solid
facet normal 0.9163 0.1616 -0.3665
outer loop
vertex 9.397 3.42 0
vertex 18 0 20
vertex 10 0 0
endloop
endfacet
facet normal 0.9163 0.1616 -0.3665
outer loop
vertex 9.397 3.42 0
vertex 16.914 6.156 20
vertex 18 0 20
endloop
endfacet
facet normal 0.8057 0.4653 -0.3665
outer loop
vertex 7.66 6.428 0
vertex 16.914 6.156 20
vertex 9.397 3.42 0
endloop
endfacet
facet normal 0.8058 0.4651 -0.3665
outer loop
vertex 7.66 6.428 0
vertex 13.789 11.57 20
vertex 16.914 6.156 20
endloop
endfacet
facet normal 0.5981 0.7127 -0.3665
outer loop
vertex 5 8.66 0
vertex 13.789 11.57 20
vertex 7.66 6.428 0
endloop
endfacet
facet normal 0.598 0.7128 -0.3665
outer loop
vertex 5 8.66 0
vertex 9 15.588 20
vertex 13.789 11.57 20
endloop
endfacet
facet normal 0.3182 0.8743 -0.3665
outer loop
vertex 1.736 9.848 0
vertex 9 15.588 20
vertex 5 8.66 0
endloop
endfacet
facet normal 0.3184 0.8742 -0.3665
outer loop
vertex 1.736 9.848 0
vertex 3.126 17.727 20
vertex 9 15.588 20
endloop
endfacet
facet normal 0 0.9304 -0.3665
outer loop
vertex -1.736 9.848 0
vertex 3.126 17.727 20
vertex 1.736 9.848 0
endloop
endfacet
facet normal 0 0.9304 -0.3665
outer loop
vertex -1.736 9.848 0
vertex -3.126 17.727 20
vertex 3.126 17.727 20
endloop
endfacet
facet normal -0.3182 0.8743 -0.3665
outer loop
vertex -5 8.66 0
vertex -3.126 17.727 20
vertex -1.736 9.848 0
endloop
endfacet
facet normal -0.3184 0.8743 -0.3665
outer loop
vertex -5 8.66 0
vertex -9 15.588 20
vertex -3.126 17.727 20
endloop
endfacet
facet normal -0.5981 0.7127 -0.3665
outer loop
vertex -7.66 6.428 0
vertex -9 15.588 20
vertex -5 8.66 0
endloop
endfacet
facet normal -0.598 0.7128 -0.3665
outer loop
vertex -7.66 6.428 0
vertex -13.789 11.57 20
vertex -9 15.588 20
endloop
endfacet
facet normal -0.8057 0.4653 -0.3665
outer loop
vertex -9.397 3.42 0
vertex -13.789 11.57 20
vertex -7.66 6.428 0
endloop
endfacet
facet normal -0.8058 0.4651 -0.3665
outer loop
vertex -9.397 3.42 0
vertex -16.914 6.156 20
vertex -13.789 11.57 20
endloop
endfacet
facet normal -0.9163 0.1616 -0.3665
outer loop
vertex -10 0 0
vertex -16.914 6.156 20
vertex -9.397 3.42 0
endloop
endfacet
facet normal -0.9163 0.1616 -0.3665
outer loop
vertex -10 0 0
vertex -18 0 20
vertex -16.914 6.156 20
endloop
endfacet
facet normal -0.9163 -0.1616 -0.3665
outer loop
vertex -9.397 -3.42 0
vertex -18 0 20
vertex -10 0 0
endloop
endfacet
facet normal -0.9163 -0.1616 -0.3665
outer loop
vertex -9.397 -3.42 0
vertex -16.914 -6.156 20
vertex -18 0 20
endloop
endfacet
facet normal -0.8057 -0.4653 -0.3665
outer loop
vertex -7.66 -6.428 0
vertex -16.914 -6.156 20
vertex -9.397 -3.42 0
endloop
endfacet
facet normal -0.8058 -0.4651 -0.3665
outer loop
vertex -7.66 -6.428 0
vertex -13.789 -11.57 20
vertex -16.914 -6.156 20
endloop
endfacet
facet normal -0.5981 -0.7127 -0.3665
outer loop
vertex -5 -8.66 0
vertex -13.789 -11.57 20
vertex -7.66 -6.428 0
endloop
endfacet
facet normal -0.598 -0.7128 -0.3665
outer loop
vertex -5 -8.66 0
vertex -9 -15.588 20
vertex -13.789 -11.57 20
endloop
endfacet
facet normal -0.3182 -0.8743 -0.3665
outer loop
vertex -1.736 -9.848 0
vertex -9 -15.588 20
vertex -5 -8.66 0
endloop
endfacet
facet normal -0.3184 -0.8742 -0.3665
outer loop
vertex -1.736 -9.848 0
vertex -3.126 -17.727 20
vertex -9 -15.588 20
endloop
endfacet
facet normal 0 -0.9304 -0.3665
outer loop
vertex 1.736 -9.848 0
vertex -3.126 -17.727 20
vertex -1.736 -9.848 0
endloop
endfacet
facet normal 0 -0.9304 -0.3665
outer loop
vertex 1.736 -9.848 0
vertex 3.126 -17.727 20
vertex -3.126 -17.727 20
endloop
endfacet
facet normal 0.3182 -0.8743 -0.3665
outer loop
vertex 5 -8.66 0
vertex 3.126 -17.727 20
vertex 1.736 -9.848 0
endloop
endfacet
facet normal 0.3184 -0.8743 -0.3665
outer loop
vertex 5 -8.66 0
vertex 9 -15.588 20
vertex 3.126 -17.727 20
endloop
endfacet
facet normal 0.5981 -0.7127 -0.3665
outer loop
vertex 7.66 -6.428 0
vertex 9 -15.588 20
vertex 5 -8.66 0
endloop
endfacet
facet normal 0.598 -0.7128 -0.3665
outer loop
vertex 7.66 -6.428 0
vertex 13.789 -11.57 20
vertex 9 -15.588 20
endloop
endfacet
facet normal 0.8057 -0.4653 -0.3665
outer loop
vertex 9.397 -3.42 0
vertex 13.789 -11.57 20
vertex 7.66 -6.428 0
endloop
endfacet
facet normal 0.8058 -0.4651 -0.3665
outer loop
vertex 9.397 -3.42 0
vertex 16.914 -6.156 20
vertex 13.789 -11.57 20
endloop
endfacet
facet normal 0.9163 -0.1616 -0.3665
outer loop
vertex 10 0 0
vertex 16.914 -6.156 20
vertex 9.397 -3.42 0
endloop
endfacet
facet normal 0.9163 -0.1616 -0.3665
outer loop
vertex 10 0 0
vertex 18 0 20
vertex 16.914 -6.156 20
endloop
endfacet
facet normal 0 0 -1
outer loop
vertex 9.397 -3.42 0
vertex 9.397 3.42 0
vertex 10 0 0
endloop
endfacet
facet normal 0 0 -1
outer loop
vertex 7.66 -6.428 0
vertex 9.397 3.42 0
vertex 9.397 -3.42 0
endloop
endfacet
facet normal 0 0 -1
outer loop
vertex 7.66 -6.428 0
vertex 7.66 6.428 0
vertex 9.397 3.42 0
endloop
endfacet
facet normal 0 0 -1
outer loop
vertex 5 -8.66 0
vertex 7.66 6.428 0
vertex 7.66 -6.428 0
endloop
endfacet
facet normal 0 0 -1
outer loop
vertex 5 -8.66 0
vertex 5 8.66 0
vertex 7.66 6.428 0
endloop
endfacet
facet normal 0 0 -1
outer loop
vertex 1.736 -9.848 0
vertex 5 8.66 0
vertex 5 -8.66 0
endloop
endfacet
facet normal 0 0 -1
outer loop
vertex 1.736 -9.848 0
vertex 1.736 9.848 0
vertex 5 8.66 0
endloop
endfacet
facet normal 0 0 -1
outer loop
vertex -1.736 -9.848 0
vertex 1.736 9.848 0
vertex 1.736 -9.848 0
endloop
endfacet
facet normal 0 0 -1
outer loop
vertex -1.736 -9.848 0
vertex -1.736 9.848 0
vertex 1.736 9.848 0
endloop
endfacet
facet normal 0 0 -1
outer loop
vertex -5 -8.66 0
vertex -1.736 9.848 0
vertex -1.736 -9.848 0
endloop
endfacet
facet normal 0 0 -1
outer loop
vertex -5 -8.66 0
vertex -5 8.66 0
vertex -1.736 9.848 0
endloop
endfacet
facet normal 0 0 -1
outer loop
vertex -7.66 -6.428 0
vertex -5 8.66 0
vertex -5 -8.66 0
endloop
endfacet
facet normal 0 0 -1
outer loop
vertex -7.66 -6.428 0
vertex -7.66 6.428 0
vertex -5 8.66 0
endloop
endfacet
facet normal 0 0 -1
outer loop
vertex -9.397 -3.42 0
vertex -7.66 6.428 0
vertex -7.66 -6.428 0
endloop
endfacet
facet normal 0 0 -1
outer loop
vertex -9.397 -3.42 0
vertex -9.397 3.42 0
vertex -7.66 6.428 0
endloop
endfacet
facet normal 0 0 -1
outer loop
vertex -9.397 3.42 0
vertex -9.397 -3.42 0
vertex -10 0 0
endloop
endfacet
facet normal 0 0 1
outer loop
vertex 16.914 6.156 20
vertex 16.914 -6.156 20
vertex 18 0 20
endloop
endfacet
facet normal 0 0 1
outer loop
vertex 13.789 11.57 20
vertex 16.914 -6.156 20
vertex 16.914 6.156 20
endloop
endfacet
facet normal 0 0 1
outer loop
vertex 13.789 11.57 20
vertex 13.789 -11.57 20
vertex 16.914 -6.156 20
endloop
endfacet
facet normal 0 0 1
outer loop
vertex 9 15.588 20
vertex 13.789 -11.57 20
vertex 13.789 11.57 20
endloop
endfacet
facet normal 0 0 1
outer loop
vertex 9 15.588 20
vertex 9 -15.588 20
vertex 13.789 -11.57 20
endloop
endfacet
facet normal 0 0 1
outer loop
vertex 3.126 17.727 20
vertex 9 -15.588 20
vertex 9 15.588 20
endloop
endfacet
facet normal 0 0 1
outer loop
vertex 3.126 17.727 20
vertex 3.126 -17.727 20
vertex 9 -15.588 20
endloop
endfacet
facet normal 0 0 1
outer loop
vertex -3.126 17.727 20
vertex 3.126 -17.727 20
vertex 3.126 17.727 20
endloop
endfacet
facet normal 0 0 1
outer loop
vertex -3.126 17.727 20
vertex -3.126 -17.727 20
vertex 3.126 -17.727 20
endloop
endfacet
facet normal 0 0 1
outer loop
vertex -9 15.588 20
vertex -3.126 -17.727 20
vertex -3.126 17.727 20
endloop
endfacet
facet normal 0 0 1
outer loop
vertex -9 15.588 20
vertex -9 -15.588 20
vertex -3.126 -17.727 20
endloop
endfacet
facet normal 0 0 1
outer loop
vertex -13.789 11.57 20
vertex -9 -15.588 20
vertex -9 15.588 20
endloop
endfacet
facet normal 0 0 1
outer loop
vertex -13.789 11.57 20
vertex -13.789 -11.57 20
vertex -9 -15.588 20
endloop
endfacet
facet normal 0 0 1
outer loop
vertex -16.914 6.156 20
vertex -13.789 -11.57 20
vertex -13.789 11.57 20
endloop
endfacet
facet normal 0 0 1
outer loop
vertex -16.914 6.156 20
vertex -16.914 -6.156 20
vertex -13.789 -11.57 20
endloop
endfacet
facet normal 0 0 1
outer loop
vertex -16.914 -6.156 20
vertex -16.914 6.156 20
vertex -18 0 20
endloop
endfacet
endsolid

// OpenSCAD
cylinder(
  h   = 20,
  r1  = 10,
  r2  = 18,
  $fa = 20);
